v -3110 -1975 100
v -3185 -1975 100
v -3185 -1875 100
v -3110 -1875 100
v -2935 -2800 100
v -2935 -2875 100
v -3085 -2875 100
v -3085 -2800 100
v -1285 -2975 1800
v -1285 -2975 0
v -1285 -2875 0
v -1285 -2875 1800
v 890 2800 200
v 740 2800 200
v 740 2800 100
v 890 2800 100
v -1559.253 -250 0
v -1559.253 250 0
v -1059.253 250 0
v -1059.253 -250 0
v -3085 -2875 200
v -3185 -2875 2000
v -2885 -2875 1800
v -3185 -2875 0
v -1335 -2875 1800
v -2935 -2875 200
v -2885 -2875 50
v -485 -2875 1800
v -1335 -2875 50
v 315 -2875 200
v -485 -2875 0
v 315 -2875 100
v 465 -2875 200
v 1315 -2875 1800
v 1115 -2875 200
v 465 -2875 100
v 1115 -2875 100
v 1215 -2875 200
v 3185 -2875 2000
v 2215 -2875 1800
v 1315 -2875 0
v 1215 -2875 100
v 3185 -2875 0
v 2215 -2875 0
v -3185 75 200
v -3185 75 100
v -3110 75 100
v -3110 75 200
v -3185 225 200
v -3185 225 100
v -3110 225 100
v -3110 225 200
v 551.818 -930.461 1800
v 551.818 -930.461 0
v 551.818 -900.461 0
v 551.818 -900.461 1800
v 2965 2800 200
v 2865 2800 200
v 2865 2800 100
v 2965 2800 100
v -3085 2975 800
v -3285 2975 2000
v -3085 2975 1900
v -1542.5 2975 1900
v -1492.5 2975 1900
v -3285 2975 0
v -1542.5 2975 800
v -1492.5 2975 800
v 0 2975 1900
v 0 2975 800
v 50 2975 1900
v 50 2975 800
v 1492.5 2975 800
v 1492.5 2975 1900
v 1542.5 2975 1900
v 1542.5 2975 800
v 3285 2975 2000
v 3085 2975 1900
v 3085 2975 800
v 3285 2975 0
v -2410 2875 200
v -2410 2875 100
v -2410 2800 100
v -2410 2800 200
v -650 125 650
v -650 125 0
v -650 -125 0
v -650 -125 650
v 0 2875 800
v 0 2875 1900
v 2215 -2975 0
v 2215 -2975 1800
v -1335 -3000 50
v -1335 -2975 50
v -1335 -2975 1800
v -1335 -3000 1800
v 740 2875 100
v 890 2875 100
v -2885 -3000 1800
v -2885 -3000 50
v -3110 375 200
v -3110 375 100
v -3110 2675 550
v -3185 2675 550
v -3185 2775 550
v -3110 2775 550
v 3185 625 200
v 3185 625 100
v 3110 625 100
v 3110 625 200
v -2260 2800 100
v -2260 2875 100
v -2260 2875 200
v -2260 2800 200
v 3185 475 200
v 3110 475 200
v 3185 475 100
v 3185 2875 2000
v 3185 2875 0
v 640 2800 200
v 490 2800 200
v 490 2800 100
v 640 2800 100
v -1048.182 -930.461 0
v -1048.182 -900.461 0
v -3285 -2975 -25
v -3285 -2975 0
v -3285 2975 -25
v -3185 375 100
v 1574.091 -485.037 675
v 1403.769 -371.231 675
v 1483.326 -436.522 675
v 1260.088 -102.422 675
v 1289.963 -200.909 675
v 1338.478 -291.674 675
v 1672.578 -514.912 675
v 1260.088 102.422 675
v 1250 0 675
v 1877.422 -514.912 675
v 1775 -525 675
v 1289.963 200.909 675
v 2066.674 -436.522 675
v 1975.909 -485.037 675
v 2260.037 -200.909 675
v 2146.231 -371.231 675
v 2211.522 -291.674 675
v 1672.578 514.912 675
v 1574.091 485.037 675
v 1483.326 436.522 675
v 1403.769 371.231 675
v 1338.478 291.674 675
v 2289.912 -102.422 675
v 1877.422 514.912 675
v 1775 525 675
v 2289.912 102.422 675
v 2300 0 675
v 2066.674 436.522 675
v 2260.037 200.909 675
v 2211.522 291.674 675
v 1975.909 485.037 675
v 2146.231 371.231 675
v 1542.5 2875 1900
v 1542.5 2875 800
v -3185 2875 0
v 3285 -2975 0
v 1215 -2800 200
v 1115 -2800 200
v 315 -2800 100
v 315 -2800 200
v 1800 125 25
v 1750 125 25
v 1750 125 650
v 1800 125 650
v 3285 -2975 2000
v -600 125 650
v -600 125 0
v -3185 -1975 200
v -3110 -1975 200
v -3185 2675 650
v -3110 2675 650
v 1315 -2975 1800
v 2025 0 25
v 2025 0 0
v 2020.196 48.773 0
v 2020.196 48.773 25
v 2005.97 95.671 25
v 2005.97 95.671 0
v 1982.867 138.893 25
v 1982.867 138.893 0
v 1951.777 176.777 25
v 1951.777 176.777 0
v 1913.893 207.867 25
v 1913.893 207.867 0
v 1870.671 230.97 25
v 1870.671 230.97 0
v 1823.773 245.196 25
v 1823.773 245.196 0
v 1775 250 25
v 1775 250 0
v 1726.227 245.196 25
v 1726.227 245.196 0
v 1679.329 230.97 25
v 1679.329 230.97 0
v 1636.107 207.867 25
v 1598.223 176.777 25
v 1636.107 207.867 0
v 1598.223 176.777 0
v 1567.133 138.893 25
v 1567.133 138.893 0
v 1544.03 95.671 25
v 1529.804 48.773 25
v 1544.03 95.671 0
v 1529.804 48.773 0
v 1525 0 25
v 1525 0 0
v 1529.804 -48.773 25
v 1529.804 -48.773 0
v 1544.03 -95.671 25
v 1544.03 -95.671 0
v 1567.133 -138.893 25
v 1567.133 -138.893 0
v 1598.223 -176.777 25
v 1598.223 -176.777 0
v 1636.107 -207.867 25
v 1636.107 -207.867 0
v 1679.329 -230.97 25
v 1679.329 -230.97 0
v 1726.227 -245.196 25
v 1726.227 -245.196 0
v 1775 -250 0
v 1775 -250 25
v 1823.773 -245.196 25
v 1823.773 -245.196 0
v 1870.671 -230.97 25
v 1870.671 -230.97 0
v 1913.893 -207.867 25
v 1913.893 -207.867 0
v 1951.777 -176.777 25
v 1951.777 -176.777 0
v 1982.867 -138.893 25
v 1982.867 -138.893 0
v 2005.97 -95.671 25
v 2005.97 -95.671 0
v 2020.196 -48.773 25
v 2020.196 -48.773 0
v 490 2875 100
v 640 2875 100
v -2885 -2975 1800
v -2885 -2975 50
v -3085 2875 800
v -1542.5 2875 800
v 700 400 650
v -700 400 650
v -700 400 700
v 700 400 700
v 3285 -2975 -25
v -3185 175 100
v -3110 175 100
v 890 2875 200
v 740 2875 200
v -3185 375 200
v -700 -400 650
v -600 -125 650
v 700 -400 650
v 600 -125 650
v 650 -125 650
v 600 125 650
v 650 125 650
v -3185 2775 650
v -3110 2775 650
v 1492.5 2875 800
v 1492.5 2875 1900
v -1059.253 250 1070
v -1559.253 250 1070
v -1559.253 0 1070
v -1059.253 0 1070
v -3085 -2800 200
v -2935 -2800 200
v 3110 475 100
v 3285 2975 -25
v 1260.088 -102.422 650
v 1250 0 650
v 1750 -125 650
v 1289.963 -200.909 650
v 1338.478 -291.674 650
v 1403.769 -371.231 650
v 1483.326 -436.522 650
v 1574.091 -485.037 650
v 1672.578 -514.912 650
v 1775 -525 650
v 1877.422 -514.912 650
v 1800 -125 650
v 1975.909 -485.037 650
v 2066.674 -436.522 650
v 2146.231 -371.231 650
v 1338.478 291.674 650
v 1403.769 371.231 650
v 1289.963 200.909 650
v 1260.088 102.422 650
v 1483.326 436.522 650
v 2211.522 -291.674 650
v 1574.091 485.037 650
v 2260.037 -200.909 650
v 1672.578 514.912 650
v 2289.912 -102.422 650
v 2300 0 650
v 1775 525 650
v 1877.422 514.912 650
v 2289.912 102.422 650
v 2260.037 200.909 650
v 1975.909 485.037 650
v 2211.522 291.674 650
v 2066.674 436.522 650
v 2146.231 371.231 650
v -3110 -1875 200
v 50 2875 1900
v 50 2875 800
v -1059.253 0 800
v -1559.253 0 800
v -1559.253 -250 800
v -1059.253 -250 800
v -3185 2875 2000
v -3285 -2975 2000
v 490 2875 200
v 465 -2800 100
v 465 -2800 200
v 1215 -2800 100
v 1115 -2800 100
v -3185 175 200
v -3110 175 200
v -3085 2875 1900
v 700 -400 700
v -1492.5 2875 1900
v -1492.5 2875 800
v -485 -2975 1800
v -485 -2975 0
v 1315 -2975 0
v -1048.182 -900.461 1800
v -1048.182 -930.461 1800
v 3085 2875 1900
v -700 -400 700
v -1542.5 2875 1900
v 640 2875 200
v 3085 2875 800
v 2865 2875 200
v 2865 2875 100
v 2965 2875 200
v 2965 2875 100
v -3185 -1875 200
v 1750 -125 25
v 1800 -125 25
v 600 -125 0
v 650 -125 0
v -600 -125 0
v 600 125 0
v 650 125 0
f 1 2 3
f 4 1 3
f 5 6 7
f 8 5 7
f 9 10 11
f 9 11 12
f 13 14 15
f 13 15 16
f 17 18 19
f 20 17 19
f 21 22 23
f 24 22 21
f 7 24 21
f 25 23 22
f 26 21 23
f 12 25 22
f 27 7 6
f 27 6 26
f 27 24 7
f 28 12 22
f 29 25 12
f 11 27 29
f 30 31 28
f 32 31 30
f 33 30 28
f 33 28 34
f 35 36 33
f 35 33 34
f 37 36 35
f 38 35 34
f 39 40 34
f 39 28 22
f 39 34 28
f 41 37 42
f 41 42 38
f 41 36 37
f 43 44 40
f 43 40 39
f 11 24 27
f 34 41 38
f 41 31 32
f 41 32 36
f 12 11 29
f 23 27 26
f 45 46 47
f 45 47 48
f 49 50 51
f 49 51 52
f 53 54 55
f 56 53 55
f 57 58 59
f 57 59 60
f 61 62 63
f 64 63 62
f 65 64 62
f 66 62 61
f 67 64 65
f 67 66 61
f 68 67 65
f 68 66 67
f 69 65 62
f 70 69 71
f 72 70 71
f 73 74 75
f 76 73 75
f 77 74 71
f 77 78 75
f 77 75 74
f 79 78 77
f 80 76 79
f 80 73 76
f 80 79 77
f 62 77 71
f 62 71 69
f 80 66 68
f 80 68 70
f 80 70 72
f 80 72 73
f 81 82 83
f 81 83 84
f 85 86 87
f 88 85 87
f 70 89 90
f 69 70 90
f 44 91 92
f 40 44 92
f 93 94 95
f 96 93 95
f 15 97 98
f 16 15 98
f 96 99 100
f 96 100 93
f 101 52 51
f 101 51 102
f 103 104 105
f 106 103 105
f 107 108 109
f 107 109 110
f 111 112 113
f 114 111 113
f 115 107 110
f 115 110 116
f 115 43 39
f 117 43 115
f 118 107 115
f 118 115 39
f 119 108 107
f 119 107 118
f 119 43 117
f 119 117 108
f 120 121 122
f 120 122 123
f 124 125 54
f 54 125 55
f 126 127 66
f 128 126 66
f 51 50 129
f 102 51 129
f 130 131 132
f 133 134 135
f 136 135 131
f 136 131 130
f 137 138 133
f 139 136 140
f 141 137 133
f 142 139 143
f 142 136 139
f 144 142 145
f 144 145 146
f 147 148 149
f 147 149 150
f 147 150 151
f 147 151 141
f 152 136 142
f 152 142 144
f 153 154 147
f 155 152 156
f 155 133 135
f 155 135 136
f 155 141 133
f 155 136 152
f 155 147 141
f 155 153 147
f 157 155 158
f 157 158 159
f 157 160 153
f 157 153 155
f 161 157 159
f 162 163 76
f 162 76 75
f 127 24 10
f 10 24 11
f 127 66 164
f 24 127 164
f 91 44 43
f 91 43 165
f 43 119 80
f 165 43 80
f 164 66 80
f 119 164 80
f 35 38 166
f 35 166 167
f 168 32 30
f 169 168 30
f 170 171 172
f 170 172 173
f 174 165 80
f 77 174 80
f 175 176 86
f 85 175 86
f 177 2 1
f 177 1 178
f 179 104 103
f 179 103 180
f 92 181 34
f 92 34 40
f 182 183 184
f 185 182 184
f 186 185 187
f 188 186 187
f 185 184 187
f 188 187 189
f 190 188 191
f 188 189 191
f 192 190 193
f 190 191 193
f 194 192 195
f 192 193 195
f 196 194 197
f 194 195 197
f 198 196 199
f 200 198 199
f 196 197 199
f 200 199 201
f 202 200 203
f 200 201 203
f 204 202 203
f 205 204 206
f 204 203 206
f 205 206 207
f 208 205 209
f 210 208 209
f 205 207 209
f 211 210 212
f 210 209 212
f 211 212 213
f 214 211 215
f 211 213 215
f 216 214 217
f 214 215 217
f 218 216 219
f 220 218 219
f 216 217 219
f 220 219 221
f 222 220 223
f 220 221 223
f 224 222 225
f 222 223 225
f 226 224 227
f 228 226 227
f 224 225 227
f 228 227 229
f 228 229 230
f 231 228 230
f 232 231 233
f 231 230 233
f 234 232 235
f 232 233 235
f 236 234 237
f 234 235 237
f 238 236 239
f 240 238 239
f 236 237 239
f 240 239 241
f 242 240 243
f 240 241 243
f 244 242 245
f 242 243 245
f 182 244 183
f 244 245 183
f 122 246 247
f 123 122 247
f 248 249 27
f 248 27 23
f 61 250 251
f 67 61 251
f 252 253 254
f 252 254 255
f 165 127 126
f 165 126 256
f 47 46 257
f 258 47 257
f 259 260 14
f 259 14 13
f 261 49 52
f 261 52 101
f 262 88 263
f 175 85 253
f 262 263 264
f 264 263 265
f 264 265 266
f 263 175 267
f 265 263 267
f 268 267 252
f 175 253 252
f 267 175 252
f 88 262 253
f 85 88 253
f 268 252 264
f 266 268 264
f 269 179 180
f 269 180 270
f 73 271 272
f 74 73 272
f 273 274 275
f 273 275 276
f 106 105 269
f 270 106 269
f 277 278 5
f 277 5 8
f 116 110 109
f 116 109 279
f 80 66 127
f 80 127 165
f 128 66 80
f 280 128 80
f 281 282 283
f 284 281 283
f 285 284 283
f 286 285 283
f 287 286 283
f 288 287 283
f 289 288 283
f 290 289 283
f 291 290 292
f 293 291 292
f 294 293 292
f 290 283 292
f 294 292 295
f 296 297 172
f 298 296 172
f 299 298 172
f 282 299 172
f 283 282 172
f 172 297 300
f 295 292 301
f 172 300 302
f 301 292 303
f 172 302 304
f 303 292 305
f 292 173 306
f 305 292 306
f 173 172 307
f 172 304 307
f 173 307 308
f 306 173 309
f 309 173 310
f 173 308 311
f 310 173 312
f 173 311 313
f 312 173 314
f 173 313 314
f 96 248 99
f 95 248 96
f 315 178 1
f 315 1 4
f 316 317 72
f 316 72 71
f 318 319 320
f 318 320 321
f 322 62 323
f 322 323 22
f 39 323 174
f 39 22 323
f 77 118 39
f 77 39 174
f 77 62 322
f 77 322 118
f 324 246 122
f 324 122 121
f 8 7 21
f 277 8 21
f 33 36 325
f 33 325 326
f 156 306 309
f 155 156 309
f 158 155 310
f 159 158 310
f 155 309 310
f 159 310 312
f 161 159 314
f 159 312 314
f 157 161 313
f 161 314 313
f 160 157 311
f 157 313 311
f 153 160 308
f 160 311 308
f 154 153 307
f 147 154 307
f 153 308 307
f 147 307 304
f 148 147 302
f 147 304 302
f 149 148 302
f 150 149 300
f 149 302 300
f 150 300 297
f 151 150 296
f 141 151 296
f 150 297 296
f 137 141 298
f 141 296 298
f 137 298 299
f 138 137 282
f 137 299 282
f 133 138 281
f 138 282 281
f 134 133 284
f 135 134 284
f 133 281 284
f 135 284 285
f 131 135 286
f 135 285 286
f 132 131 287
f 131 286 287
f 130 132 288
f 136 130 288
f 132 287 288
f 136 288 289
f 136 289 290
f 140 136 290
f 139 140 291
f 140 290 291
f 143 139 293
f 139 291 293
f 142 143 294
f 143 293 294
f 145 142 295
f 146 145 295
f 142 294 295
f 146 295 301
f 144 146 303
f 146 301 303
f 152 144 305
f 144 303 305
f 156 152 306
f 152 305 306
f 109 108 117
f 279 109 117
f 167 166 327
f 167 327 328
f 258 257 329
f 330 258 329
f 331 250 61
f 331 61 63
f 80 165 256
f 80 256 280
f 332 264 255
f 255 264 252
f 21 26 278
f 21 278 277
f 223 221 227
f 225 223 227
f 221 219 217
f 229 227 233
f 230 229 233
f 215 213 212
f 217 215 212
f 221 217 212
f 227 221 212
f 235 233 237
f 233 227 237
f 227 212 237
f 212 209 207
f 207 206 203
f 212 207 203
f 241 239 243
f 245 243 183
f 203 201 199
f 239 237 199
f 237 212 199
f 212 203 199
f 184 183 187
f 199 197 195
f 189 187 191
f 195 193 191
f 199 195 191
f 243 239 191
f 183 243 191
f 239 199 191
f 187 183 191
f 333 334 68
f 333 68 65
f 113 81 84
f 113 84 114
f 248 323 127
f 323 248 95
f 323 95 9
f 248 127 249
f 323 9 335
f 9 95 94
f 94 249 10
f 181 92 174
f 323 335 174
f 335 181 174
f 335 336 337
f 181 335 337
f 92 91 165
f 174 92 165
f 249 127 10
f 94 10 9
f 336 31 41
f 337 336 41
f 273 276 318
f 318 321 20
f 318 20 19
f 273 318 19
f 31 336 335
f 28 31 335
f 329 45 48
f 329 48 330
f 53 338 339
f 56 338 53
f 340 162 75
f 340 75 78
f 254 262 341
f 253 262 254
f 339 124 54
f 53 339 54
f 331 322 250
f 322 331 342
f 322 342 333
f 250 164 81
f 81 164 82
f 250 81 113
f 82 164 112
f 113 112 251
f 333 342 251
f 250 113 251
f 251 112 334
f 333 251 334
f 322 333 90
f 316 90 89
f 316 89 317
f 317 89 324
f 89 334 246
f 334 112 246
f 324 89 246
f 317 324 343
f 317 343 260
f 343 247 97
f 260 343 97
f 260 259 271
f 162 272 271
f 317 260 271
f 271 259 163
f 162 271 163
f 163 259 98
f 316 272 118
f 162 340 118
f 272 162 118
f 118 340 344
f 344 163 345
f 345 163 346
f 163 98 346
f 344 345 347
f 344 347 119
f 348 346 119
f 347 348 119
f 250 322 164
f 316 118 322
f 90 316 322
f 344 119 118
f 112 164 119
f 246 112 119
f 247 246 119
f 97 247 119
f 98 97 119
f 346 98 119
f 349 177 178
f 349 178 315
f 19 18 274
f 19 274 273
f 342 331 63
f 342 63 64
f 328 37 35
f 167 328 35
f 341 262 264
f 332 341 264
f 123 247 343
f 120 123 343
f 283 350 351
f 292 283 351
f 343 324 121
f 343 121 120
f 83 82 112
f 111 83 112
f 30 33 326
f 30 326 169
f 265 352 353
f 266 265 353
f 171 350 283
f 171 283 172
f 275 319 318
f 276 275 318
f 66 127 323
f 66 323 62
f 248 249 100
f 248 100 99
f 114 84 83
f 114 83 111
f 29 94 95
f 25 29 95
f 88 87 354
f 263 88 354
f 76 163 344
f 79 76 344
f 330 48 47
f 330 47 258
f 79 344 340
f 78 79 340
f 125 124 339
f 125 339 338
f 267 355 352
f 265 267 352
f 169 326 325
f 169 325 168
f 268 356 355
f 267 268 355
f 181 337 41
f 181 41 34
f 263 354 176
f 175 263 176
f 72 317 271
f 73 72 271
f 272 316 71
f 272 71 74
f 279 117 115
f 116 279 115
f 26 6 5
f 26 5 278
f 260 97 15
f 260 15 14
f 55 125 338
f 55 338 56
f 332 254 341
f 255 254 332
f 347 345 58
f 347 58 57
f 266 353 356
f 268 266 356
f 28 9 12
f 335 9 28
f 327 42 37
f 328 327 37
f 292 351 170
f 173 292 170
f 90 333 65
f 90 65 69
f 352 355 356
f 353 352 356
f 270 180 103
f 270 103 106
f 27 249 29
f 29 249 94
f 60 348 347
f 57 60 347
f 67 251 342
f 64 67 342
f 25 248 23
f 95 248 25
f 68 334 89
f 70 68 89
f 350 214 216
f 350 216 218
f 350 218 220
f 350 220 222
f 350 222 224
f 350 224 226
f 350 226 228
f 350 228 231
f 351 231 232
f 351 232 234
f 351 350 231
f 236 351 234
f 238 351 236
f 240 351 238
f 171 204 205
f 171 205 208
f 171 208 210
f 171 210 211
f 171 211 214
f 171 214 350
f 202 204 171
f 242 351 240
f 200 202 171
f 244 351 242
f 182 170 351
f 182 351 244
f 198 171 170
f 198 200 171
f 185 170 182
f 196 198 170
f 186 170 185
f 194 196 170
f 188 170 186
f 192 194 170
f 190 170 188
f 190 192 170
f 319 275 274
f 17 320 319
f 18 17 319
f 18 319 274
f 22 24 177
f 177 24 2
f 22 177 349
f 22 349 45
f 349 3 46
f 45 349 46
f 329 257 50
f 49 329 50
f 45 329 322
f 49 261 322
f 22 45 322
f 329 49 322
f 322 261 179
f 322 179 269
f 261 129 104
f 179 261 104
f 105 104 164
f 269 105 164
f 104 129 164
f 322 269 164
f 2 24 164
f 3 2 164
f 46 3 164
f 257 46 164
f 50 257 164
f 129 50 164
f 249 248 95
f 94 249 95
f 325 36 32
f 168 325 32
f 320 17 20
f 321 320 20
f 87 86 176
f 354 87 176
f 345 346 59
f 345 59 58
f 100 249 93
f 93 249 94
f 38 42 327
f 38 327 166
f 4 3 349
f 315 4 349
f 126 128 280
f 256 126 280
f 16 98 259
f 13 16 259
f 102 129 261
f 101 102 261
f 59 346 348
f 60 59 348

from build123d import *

# Parameters (mm, degrees)
F0_W      = 6570
F0_H      = 5950
F0_W_2    = 6370
F0_H_2    = 5750
F1_DEPTH  = 2000
F2_DEPTH  = 25
F3_W      = 800
F3_H      = 1800
F3_W_2    = 900
F3_W_3    = 1550
F3_H_2    = 1750
F4_DEPTH  = 100
F5_DEPTH  = 25
F6_W      = 1542.5
F6_H      = 1100
F6_W_2    = 1492.5
F6_W_3    = 1442.5
F7_DEPTH  = 100
F9_DEPTH  = 650
F10_W     = 1400
F10_H     = 800
F10_W_2   = 50
F10_H_2   = 250
F11_DEPTH = 50
F8_W      = 50
F8_H      = 250
F12_DEPTH = 650
F8_R      = 250
F13_DEPTH = 25
F14_R     = 525
F14_W     = 50
F14_H     = 250
F15_DEPTH = 25
F16_W     = 100
F16_H     = 100
F16_W_2   = 150
F17_DEPTH = 75
F18_W     = 150
F18_H     = 100
F18_W_2   = 100
F19_DEPTH = 75
F20_W     = 150
F20_H     = 100
F21_DEPTH = 75
F22_W     = 150
F22_H     = 100
F22_W_2   = 100
F23_DEPTH = 75
F24_W     = 500
F24_H     = 500
F25_DEPTH = 800
F26_W     = 500
F26_H     = 250
F27_DEPTH = 270
F28_W     = 1600
F28_H     = 30
F29_DEPTH = 1800


with BuildPart() as f1:
    # F0 (on Top) → F1 (new body)
    with BuildSketch(Plane.XY):
        Rectangle(F0_W, F0_H)
        Rectangle(F0_W_2, F0_H_2, mode=Mode.SUBTRACT)
    extrude(amount=F1_DEPTH)

    # F3 (on face) → F4 (cut, through all)
    with BuildSketch(Plane.XZ.offset(2975)):
        with Locations((-885, 900)):
            Rectangle(F3_W, F3_H)
        with Locations((1765, 900)):
            Rectangle(F3_W_2, F3_H)
        with Locations((-2110, 925)):
            Rectangle(F3_W_3, F3_H_2)
    extrude(amount=-F4_DEPTH, mode=Mode.SUBTRACT)

    # F6 (on face) → F7 (cut, through all)
    with BuildSketch(Plane.XZ.offset(-2875)):
        with Locations((-2313.75, 1350)):
            Rectangle(F6_W, F6_H)
        with Locations((-746.25, 1350)):
            Rectangle(F6_W_2, F6_H)
        with Locations((771.25, 1350)):
            Rectangle(F6_W_3, F6_H)
        with Locations((2313.75, 1350)):
            Rectangle(F6_W, F6_H)
    extrude(amount=-F7_DEPTH, mode=Mode.SUBTRACT)

    # F16 (on face) → F17 (join)
    with BuildSketch(Plane.YZ.offset(-3185)):
        with Locations((2725, 600)):
            Rectangle(F16_W, F16_H)
        with Locations((125, 150)):
            Rectangle(F16_W, F16_H)
        with Locations((300, 150)):
            Rectangle(F16_W_2, F16_H)
        with Locations((-1925, 150)):
            Rectangle(F16_W, F16_H)
    extrude(amount=F17_DEPTH)

    # F18 (on face) → F19 (join)
    with BuildSketch(Plane(origin=(0, -2875, 0), x_dir=(-1, 0, 0), z_dir=(0, 1, 0))):
        with Locations((3010, 150)):
            Rectangle(F18_W, F18_H)
        with Locations((-390, 150)):
            Rectangle(F18_W, F18_H)
        with Locations((-1165, 150)):
            Rectangle(F18_W_2, F18_H)
    extrude(amount=F19_DEPTH)

    # F20 (on face) → F21 (join)
    with BuildSketch(Plane(origin=(3185, 0, 0), x_dir=(0, -1, 0), z_dir=(-1, 0, 0))):
        with Locations((-550, 150)):
            Rectangle(F20_W, F20_H)
    extrude(amount=F21_DEPTH)

    # F22 (on face) → F23 (join)
    with BuildSketch(Plane.XZ.offset(-2875)):
        with Locations((-2335, 150)):
            Rectangle(F22_W, F22_H)
        with Locations((565, 150)):
            Rectangle(F22_W, F22_H)
        with Locations((815, 150)):
            Rectangle(F22_W, F22_H)
        with Locations((2915, 150)):
            Rectangle(F22_W_2, F22_H)
    extrude(amount=F23_DEPTH)


with BuildPart() as f2:
    # F0 (on Top) → F2 (new body)
    with BuildSketch(Plane.XY):
        Rectangle(F0_W, F0_H)
        Rectangle(F0_W_2, F0_H_2, mode=Mode.SUBTRACT)
        Rectangle(F0_W_2, F0_H_2)
    extrude(amount=-F2_DEPTH)


with BuildPart() as f5:
    # F3 (on face) → F5 (new body)
    with BuildSketch(Plane.XZ.offset(2975)):
        with Locations((-2110, 925)):
            Rectangle(F3_W_3, F3_H_2)
    extrude(amount=F5_DEPTH)


with BuildPart() as f9:
    # F8 (on Top) → F9 (new body)
    with BuildSketch(Plane.XY):
        Polygon((-600, 2.5), (-600, 125), (-650, 125), (-650, -125), (-600, -125), (-600, -2.5), align=None)
    extrude(amount=F9_DEPTH)



with BuildPart() as f9b:
    # F8 (on Top) → F9, piece 2 (new body)
    with BuildSketch(Plane.XY):
        Polygon((600, 125), (600, 2.5), (600, -2.5), (600, -125), (650, -125), (650, 125), align=None)
    extrude(amount=F9_DEPTH)


with BuildPart() as f9_1:
    add(f9.part)

    add(f9b.part)  # F11 merges F9b
    # F10 (on face) → F11 (join)
    with BuildSketch(Plane.XY.offset(650)):
        Rectangle(F10_W, F10_H)
        with Locations((-625, 0)):
            Rectangle(F10_W_2, F10_H_2, mode=Mode.SUBTRACT)
        with Locations((-625, 0)):
            Rectangle(F10_W_2, F10_H_2)
    extrude(amount=F11_DEPTH)


with BuildPart() as f12:
    # F8 (on Top) → F12 (new body)
    with BuildSketch(Plane.XY):
        with Locations((1775, 0)):
            Rectangle(F8_W, F8_H)
    extrude(amount=F12_DEPTH)

    # F8 (on Top) → F13 (join)
    with BuildSketch(Plane.XY):
        with Locations((1775, 0)):
            Circle(F8_R)
        with Locations((1775, 0)):
            Rectangle(F8_W, F8_H, mode=Mode.SUBTRACT)
    extrude(amount=F13_DEPTH)

    # F14 (on face) → F15 (join)
    with BuildSketch(Plane.XY.offset(650)):
        with Locations((1775, 0)):
            Circle(F14_R)
        with Locations((1775, 0)):
            Rectangle(F14_W, F14_H, mode=Mode.SUBTRACT)
        with Locations((1775, 0)):
            Rectangle(F14_W, F14_H)
    extrude(amount=F15_DEPTH)


with BuildPart() as f25:
    # F24 (on face) → F25 (new body)
    with BuildSketch(Plane.XY):
        with Locations((-1309.2528581619, 0)):
            Rectangle(F24_W, F24_H)
    extrude(amount=F25_DEPTH)

    # F26 (on face) → F27 (join)
    with BuildSketch(Plane.XY.offset(800)):
        with Locations((-1309.2528581619, 125)):
            Rectangle(F26_W, F26_H)
    extrude(amount=F27_DEPTH)


with BuildPart() as f29:
    # F28 (on face) → F29 (new body)
    with BuildSketch(Plane.XY):
        with Locations((-248.1821009796, -915.4608845711)):
            Rectangle(F28_W, F28_H)
    extrude(amount=F29_DEPTH)


solid = Compound([f1.part, f2.part, f5.part, f9_1.part, f12.part, f25.part, f29.part])
